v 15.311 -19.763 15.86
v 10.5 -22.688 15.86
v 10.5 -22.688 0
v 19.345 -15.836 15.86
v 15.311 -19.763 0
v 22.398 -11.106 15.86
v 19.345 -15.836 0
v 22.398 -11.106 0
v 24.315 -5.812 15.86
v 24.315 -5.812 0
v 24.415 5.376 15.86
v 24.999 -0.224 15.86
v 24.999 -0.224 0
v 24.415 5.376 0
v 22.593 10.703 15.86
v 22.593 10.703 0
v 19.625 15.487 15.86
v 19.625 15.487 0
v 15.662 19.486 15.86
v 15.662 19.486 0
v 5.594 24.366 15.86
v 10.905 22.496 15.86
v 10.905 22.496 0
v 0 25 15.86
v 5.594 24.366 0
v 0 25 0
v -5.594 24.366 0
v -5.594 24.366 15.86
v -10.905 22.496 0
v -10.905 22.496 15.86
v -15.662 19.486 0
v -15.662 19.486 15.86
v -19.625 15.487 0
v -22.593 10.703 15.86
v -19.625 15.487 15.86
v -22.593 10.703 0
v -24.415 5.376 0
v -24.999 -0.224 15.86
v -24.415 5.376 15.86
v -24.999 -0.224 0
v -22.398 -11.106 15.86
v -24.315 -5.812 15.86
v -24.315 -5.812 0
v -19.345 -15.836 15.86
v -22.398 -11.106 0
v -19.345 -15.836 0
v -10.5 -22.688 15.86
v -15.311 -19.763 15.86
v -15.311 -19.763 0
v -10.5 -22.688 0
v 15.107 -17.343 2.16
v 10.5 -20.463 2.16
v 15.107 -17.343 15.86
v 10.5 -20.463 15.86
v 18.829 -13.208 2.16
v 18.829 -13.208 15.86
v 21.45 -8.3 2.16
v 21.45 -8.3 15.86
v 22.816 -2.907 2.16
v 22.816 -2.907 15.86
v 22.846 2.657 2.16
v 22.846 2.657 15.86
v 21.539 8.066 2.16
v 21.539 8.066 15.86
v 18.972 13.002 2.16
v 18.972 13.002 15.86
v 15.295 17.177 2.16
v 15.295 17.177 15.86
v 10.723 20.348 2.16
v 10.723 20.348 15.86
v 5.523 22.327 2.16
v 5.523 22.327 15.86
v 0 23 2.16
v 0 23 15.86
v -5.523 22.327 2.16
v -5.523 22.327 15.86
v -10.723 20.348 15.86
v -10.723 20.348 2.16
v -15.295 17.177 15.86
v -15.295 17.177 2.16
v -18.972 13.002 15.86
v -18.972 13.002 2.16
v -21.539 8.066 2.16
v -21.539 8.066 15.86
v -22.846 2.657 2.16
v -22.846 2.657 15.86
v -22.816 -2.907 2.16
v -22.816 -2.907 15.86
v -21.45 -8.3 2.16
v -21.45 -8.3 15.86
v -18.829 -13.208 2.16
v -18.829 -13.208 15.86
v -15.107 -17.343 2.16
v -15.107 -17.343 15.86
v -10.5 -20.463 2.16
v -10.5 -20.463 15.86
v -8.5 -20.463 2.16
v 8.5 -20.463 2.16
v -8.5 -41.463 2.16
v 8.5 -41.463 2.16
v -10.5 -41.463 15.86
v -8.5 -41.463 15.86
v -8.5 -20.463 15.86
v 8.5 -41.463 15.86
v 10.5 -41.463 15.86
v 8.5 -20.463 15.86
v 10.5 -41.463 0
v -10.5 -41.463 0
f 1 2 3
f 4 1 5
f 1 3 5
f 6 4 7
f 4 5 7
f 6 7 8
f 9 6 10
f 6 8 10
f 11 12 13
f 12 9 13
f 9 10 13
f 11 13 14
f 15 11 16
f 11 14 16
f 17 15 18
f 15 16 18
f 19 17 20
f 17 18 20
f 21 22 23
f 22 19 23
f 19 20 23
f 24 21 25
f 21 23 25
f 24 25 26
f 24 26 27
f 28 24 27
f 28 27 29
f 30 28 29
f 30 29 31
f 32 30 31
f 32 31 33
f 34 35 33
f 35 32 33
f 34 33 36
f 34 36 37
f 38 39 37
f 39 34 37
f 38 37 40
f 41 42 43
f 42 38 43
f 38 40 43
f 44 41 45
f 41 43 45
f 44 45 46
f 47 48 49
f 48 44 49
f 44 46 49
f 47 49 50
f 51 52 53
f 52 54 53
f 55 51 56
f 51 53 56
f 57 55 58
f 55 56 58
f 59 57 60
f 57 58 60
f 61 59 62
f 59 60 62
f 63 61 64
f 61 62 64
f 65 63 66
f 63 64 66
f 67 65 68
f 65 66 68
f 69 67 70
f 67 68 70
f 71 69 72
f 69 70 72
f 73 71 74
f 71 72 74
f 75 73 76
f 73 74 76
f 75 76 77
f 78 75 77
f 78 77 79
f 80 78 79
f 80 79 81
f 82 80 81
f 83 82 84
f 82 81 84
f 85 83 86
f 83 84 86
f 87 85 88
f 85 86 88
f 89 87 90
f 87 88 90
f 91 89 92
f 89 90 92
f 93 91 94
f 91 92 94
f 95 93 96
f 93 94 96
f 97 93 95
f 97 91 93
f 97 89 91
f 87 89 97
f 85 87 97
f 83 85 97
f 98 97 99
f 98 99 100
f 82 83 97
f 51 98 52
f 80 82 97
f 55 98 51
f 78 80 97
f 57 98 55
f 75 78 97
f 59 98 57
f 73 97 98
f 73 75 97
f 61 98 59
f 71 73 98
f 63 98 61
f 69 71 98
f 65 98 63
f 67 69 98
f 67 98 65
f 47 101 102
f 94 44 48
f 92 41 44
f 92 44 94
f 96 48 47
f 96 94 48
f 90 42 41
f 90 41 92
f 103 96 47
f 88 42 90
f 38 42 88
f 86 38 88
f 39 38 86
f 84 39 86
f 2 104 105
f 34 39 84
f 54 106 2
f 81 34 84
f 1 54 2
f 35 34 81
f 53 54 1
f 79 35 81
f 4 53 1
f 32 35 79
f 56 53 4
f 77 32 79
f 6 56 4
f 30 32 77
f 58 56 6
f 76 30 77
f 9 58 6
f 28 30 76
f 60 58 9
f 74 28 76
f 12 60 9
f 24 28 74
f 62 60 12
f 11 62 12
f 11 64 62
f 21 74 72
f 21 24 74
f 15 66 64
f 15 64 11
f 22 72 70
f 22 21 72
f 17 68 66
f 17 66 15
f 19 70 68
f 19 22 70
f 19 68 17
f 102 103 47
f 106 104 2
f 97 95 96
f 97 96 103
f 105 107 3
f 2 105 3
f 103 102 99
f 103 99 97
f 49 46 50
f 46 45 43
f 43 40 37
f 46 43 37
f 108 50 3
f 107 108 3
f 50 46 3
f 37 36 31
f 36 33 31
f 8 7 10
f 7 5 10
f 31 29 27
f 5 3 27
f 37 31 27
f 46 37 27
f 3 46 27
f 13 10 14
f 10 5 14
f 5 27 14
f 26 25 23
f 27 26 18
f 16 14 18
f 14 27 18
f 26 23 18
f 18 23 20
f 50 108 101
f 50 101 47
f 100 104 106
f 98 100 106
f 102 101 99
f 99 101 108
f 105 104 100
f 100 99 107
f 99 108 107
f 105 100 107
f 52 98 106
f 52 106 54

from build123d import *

# Parameters (mm, degrees)
F0_R     = 25
F1_DEPTH = 15.86
F2_R     = 23
F3_DEPTH = 13.7
F4_W     = 21
F4_H     = 21
F5_DEPTH = 15.86
F6_W     = 17
F6_H     = 21
F7_DEPTH = 13.7


with BuildPart() as f1:
    # F0 (on Top) → F1 (new body)
    with BuildSketch(Plane.XY):
        Circle(F0_R)
    extrude(amount=F1_DEPTH)

    # F2 (on face) → F3 (cut)
    with BuildSketch(Plane.XY.offset(15.86)):
        Circle(F2_R)
    extrude(amount=-F3_DEPTH, mode=Mode.SUBTRACT)

    # F4 (on Top) → F5 (join, through all)
    with BuildSketch(Plane.XY):
        with Locations((0, -30.9633819297)):
            Rectangle(F4_W, F4_H)
    extrude(amount=F5_DEPTH)

    # F6 (on face) → F7 (cut, through all)
    with BuildSketch(Plane.XY.offset(15.86)):
        with Locations((0, -30.9633819297)):
            Rectangle(F6_W, F6_H)
    extrude(amount=-F7_DEPTH, mode=Mode.SUBTRACT)


solid = f1.part
